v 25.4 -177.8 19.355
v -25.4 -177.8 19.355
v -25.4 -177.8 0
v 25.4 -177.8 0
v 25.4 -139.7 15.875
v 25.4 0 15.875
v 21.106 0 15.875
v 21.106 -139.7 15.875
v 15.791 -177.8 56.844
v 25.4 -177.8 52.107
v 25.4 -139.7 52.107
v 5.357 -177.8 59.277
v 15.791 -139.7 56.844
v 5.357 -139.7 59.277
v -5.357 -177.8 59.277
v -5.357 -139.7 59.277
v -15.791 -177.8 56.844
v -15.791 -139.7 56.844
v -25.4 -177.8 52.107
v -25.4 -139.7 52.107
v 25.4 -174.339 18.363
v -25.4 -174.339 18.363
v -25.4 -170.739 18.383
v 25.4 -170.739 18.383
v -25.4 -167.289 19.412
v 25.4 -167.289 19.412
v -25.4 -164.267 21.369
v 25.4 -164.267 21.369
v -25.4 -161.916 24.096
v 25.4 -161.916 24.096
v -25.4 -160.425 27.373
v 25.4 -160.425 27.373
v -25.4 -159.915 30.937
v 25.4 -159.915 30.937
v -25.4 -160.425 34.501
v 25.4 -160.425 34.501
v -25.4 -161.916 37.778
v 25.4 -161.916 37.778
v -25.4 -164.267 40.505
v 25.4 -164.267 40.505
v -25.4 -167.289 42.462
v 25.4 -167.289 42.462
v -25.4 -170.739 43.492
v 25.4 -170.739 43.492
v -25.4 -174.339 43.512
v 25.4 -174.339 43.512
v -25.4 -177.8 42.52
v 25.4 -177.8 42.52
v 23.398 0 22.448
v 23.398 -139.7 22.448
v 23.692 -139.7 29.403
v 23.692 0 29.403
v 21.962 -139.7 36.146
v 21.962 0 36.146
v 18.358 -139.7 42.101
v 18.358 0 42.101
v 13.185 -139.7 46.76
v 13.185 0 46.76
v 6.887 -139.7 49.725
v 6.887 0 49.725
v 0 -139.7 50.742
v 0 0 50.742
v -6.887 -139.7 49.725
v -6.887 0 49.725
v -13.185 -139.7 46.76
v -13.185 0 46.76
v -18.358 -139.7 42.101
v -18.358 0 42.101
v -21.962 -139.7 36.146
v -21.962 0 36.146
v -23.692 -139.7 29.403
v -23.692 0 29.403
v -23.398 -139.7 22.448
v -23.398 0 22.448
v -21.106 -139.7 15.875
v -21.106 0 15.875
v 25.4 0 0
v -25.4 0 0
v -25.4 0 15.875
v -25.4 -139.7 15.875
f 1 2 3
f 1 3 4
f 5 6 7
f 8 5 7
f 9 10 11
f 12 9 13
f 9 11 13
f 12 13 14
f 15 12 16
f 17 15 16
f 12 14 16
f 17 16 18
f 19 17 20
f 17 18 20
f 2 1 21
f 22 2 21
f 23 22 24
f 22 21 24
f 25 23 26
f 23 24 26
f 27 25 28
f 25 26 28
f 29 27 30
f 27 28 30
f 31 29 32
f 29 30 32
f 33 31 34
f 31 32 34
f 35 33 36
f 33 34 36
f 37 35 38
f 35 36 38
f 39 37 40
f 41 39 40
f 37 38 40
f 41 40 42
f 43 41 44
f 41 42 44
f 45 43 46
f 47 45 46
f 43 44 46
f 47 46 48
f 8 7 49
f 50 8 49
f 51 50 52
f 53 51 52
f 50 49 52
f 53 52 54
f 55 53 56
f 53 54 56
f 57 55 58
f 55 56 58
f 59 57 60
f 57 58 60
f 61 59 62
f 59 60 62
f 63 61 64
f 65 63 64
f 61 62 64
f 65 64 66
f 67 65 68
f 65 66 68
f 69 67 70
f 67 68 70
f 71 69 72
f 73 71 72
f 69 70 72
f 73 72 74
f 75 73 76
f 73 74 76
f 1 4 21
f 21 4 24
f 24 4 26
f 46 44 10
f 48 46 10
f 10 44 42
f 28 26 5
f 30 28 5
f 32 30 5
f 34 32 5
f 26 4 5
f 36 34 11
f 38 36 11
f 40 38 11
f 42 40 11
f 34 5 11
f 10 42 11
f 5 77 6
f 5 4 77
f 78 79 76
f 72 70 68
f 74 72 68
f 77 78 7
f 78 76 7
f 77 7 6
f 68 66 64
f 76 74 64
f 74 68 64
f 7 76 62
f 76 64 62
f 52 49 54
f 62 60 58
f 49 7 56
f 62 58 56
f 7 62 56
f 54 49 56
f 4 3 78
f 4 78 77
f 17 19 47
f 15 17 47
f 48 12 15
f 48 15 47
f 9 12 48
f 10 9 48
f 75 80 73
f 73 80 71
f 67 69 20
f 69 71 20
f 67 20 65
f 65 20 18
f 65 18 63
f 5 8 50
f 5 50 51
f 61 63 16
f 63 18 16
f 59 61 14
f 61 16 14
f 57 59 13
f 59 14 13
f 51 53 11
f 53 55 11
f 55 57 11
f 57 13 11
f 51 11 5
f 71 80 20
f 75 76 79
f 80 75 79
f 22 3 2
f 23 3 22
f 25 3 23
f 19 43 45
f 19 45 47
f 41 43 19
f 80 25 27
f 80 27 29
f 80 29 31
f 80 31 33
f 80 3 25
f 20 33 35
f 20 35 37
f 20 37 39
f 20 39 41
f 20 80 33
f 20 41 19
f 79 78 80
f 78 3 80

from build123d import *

# Parameters (mm, degrees)
F1_DEPTH = 139.7
F2_W     = 50.8
F2_H     = 52.107124
F3_DEPTH = 38.1
F5_DEPTH = 50.8


with BuildPart() as f1:
    # F0 (on Front) → F1 (new body)
    with BuildSketch(Plane.XZ):
        with BuildLine():
            Line((-25.4, 0), (0, 0))
            Line((0, 0), (25.4, 0))
            Line((25.4, 0), (25.4, 15.875))
            Line((25.4, 15.875), (21.106379, 15.875))
            ThreePointArc((21.106379, 15.875), (0, 50.741647), (-21.106379, 15.875))
            Line((-21.106379, 15.875), (-25.4, 15.875))
            Line((-25.4, 15.875), (-25.4, 0))
        make_face()
    extrude(amount=F1_DEPTH)

    # F2 (on face) → F3 (join)
    with BuildSketch(Plane.XZ.offset(139.7)):
        with BuildLine():
            Line((-25.4, 52.107124), (25.4, 52.107124))
            ThreePointArc((25.4, 52.107124), (0, 59.583701), (-25.4, 52.107124))
        make_face()
        with Locations((0, 26.053562)):
            Rectangle(F2_W, F2_H)
    extrude(amount=F3_DEPTH)

    # F4 (on face) → F5 (cut)
    with BuildSketch(Plane.YZ.offset(25.4)):
        with BuildLine():
            Line((-177.8, 42.519599), (-177.8, 19.3548))
            ThreePointArc((-177.8, 19.3548), (-159.914738, 30.937199), (-177.8, 42.519599))
        make_face()
    extrude(amount=-F5_DEPTH, mode=Mode.SUBTRACT)


solid = f1.part
